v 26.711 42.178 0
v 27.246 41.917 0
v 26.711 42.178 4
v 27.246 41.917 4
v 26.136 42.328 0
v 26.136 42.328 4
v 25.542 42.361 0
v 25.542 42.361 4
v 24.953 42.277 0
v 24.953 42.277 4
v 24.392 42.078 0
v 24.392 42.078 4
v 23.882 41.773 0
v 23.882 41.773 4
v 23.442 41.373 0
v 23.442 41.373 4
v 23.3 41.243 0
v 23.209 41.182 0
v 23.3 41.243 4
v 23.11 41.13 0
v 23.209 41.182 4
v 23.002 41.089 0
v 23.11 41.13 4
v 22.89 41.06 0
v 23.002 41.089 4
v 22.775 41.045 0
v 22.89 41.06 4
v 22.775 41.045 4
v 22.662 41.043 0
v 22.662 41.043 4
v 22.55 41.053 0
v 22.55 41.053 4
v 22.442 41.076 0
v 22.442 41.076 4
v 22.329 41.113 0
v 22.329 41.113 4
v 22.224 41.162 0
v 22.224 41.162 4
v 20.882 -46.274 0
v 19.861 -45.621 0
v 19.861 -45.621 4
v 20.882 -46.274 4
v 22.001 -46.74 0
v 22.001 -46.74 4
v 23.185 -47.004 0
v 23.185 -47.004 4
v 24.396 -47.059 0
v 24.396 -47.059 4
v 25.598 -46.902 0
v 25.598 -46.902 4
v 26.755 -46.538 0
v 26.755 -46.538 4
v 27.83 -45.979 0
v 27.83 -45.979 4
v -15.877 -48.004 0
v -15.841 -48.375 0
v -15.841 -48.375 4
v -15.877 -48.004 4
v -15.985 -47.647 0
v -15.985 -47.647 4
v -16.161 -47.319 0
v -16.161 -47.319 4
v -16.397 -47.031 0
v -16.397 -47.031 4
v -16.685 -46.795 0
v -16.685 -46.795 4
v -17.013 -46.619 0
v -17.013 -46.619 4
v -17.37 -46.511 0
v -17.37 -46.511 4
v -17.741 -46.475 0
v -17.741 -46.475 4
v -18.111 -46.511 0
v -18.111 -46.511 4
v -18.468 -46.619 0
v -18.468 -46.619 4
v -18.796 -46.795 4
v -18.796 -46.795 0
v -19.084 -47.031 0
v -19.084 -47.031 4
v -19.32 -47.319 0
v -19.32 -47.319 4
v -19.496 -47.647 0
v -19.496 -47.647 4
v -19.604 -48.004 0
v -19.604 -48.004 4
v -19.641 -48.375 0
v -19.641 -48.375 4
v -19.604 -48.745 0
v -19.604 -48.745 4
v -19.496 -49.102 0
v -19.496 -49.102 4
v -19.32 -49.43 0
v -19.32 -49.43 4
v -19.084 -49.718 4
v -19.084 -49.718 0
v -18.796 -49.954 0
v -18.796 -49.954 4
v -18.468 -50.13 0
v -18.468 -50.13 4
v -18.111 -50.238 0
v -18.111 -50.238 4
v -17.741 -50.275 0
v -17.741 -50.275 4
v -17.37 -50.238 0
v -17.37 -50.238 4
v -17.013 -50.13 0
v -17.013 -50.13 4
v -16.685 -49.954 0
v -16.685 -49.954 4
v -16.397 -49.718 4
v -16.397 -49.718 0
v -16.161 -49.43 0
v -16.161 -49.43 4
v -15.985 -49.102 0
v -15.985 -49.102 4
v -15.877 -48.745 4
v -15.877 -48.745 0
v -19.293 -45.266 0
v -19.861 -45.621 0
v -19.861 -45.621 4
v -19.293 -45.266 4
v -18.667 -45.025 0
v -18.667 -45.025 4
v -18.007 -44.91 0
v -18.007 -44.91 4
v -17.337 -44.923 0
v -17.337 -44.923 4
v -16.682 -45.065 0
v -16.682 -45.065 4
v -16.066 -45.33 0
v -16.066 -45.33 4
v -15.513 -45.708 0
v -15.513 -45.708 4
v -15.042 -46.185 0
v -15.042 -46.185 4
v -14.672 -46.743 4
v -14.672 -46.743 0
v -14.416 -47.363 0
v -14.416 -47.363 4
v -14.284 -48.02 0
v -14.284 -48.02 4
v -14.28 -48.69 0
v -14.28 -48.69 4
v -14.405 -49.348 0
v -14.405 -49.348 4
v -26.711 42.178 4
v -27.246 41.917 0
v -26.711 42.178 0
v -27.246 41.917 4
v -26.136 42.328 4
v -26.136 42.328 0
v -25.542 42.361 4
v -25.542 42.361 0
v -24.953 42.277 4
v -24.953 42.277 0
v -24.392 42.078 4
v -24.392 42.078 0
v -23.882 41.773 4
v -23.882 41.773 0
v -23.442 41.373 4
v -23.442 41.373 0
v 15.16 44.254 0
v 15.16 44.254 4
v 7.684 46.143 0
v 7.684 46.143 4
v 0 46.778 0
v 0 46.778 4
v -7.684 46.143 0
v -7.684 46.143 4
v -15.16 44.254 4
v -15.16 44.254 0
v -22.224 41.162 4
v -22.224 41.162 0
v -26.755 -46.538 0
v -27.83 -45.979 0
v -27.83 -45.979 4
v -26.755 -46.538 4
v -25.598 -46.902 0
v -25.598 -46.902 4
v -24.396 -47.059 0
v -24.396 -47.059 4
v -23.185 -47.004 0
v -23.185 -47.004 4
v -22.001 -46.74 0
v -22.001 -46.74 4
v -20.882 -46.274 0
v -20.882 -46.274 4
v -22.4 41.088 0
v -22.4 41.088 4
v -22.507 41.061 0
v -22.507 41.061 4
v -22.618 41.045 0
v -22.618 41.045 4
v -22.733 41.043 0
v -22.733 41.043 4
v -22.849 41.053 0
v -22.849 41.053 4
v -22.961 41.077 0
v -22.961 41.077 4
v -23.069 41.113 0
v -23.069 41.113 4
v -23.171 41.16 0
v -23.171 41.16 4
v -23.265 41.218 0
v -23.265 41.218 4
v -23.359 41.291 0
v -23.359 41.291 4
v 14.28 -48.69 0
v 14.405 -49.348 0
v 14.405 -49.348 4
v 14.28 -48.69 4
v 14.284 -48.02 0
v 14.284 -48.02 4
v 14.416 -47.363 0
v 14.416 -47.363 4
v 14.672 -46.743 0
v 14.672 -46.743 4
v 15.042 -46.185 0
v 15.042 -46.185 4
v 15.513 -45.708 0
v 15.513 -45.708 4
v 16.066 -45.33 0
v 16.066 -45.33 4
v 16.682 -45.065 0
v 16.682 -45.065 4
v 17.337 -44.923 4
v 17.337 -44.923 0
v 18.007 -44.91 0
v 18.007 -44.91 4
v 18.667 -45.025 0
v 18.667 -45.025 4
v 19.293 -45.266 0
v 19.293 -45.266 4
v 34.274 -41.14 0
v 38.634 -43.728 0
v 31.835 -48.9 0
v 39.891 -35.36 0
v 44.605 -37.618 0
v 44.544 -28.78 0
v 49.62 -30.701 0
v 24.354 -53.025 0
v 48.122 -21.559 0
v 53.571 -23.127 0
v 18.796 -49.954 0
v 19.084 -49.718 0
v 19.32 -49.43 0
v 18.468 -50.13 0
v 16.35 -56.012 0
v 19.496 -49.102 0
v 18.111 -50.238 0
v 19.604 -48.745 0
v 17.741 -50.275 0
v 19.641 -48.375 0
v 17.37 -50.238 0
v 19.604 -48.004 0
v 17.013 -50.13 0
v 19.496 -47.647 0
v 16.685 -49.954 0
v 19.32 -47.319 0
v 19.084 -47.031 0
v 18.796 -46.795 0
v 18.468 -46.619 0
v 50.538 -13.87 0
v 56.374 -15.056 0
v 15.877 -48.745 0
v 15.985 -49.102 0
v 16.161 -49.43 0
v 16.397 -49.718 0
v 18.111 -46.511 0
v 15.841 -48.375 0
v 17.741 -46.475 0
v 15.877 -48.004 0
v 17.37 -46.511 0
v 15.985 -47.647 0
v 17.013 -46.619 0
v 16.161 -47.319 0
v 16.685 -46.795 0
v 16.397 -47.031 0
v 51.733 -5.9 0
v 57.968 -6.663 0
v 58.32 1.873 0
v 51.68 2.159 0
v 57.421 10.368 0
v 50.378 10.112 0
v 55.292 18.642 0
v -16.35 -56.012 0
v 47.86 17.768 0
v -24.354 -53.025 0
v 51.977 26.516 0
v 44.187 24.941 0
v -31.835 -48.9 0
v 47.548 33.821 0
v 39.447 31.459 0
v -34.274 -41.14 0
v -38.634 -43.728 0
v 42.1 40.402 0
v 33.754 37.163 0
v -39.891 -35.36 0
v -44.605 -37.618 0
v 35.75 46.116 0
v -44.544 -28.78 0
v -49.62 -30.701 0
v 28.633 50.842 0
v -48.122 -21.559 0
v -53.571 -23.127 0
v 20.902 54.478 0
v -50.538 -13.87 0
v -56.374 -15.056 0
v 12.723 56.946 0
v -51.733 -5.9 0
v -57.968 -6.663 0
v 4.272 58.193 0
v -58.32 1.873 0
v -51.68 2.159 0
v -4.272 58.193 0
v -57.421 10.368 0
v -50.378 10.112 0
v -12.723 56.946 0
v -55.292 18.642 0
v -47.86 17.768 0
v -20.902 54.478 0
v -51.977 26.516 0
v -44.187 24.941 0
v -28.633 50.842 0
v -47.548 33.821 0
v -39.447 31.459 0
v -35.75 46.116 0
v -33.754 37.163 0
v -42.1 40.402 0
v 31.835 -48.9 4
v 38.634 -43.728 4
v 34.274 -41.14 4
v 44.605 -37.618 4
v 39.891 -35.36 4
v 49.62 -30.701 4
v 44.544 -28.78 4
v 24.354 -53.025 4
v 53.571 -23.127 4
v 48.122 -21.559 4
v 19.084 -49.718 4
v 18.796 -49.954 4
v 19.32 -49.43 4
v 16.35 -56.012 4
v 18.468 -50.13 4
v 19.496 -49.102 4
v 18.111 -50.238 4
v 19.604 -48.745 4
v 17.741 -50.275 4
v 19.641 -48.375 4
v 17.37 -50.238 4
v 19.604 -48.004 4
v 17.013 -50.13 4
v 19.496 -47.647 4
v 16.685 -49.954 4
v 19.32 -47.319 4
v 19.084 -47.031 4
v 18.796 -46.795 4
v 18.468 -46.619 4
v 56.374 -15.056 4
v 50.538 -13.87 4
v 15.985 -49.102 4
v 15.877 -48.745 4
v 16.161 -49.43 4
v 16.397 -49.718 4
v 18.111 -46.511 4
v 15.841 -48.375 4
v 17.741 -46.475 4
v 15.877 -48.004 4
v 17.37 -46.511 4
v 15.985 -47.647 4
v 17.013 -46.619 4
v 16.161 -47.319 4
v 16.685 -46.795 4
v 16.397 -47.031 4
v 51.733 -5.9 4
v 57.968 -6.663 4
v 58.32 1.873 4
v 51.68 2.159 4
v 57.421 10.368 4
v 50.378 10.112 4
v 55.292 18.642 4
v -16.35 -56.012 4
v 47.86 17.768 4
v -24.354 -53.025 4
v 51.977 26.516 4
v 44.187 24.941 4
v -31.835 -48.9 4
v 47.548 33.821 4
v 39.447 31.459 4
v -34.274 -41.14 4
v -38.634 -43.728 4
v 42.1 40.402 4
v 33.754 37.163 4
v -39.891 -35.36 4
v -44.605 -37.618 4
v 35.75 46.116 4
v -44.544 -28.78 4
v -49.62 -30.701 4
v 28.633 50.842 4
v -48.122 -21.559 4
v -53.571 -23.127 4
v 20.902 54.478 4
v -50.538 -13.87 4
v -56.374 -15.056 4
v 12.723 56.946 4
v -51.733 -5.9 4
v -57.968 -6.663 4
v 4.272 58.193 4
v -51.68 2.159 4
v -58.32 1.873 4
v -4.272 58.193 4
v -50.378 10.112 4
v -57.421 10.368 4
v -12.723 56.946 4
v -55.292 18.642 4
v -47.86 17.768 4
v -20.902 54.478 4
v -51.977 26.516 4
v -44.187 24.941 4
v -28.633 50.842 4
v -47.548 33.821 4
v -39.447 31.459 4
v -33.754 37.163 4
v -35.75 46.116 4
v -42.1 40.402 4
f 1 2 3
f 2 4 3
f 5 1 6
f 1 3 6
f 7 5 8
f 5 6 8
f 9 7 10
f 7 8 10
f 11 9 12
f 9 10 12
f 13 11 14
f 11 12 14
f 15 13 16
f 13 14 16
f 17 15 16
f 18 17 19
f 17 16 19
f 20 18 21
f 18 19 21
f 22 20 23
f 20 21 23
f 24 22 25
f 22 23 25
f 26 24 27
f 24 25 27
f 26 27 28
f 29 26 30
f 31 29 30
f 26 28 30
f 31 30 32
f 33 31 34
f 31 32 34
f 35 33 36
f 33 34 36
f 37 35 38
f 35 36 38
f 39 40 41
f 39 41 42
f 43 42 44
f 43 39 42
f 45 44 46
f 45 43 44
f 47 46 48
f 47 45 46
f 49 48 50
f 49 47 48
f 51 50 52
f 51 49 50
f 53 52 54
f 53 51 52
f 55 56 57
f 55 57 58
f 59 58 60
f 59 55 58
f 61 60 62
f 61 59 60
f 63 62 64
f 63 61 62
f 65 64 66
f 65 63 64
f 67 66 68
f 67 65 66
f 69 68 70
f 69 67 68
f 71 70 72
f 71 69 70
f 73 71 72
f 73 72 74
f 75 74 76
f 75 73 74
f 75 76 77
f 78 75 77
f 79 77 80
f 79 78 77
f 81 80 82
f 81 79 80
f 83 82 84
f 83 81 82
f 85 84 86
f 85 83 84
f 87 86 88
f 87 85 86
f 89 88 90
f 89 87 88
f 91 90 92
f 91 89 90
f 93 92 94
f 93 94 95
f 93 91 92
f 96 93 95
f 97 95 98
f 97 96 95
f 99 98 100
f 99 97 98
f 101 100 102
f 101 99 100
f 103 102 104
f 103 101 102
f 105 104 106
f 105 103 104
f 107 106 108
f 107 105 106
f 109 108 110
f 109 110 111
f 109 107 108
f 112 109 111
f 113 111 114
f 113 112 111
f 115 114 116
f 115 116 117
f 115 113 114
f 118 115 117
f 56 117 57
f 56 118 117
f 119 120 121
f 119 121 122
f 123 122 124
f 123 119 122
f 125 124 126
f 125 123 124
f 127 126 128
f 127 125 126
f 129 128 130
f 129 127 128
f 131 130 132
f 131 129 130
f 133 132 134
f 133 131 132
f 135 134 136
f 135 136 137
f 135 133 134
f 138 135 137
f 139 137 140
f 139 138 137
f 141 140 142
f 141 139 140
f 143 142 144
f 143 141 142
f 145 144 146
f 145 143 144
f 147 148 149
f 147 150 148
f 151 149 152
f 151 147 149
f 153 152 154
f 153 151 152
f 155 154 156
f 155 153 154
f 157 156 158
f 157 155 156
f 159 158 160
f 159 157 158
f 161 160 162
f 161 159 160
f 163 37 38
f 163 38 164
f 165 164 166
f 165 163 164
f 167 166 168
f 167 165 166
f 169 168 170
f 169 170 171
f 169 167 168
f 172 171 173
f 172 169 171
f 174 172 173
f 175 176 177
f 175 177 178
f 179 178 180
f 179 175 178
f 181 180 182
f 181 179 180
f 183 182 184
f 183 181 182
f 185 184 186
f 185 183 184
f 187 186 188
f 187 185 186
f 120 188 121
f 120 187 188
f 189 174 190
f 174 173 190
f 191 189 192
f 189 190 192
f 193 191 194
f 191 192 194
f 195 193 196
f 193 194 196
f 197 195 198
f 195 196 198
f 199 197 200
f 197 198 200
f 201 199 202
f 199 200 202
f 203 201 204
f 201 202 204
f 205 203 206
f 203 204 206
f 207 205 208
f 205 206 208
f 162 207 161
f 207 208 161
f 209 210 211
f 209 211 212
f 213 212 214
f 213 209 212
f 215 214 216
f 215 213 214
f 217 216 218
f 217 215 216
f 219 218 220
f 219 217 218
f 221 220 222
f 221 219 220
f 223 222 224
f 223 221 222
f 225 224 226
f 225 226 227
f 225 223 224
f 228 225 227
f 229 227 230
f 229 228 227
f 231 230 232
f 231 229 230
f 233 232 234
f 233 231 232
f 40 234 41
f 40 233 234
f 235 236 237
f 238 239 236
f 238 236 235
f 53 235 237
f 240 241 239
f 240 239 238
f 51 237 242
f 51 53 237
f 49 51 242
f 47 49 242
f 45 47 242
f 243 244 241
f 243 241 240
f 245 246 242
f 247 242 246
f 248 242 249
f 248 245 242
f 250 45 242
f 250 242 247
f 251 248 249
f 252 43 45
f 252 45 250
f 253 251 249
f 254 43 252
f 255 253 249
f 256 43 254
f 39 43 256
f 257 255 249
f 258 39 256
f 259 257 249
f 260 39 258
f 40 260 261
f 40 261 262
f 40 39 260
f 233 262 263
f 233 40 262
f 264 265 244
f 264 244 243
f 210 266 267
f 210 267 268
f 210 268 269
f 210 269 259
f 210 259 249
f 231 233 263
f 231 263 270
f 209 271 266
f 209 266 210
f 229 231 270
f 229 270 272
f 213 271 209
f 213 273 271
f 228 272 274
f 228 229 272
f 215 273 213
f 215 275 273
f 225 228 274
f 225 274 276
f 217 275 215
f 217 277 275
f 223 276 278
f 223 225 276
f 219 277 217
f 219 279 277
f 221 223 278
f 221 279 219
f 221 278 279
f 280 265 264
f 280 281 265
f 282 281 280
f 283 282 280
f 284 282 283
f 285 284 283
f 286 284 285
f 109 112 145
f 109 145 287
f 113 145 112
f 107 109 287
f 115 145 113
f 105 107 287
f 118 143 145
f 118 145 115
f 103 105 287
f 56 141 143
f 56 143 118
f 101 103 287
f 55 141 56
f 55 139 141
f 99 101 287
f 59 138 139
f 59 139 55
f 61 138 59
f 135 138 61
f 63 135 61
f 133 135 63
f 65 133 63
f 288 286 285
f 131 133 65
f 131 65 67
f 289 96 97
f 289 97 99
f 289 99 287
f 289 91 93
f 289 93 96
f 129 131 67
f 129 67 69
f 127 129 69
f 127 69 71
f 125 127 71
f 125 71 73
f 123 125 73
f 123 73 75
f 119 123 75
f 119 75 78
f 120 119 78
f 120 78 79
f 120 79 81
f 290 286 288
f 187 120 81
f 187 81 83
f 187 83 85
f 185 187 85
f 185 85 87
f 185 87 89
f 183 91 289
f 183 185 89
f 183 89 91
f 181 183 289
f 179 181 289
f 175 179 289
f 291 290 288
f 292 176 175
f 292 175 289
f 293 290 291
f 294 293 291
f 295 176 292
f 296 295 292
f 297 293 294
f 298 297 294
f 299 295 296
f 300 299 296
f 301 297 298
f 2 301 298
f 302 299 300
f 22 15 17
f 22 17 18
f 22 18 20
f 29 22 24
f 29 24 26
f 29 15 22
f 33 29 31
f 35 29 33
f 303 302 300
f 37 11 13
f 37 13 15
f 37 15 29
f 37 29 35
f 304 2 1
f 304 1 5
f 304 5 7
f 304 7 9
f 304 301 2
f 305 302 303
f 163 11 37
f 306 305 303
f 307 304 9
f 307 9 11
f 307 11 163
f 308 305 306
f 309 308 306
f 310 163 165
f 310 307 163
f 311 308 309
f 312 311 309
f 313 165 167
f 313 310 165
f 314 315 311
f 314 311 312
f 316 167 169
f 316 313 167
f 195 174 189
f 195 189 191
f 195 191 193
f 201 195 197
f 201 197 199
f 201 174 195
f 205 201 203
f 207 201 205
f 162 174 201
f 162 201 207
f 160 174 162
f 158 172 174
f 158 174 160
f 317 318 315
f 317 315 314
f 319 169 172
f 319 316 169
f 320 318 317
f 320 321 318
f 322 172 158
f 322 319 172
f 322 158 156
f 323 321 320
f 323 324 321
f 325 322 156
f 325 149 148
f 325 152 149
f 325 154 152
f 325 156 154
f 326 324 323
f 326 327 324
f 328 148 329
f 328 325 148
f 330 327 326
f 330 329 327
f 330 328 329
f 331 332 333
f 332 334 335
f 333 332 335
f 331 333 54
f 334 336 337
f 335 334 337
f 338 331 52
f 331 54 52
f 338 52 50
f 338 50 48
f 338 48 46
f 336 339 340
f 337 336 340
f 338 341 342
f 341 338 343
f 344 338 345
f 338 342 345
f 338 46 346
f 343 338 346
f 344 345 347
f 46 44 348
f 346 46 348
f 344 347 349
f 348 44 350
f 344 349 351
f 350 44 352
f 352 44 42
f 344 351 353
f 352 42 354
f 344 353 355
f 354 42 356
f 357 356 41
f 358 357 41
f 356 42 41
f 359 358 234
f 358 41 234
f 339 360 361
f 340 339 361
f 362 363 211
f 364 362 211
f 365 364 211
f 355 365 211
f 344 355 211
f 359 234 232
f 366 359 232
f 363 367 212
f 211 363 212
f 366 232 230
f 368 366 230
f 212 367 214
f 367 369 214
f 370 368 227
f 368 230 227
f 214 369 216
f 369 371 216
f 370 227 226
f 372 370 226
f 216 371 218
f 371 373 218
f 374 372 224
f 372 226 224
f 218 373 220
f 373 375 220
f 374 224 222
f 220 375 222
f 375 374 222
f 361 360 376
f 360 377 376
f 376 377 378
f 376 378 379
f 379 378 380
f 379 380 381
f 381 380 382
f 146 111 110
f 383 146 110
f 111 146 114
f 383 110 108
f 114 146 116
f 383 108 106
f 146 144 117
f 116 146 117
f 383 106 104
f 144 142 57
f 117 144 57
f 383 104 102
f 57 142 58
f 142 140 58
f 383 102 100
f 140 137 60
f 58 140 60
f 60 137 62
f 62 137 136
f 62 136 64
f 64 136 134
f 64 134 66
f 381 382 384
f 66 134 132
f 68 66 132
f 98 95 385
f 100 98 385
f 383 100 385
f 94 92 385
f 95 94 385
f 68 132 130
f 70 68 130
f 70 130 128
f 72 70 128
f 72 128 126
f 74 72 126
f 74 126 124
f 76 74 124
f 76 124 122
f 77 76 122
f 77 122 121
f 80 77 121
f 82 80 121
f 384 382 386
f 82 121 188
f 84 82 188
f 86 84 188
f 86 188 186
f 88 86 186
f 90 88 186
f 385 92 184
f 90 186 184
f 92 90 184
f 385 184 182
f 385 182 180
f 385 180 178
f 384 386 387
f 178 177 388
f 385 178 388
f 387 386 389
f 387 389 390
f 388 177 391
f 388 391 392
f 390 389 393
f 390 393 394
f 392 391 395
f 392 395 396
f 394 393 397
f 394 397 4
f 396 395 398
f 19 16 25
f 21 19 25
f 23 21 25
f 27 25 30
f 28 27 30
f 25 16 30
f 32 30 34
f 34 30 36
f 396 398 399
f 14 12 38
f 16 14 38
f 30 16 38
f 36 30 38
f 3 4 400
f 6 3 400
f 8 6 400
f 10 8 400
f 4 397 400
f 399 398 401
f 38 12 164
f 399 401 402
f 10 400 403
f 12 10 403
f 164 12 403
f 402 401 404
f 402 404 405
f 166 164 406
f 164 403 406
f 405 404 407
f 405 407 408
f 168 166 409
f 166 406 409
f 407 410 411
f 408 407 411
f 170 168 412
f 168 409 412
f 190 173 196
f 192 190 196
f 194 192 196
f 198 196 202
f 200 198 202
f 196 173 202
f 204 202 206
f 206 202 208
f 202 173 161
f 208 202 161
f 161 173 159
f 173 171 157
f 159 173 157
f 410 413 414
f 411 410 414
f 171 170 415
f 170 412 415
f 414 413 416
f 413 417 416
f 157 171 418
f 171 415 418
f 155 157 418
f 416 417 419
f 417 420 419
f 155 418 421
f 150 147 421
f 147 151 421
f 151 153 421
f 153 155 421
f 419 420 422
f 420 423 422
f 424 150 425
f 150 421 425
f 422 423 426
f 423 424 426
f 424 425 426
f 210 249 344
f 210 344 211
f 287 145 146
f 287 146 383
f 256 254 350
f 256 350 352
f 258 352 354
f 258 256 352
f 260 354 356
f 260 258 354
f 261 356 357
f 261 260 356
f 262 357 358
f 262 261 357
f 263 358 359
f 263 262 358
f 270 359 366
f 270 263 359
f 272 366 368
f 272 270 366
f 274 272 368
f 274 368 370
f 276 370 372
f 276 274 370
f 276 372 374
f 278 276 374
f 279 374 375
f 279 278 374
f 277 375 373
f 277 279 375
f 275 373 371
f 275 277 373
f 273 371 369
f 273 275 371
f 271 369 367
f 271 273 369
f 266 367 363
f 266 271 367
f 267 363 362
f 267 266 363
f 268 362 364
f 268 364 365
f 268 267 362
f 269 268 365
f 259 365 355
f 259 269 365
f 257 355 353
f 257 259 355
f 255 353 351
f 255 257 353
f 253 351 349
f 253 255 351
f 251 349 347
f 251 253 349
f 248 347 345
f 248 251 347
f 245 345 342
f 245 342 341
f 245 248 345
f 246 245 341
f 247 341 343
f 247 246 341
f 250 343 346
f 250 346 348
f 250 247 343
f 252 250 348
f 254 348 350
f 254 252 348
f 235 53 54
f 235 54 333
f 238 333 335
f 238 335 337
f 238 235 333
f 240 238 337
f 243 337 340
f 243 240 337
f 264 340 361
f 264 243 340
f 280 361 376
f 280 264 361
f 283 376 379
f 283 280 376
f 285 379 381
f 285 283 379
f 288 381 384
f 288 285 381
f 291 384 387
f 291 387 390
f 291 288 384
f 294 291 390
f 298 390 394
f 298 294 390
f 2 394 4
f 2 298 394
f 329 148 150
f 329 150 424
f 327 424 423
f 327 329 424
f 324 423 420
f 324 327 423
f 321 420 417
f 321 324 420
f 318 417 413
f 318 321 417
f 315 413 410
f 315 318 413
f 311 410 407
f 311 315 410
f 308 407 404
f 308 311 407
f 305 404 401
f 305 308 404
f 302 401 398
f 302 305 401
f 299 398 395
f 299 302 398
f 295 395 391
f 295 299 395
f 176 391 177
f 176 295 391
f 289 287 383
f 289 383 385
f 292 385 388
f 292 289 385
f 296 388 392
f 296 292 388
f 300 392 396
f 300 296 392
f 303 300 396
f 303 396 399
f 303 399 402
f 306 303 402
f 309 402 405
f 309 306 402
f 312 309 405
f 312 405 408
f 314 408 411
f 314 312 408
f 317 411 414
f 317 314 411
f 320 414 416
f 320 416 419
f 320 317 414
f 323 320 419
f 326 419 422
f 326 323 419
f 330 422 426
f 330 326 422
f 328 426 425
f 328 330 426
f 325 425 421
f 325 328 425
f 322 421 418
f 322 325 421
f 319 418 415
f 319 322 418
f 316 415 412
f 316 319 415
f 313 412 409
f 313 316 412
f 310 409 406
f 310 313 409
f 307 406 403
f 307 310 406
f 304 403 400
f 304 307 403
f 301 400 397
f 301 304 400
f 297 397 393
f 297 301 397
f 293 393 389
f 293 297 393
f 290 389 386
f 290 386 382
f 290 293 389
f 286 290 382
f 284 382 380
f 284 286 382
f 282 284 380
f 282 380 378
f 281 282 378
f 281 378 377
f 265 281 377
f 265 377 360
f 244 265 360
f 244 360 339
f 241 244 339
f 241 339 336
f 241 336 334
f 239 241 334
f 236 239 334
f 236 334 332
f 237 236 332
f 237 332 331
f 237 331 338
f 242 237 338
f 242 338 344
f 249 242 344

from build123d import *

# Parameters (mm, degrees)
SKETCH1_R           = 1.9
BOSS_EXTRUDE1_DEPTH = 4
BOSS_EXTRUDE2_DEPTH = 4
FILLET1_R           = 3
FILLET2_R           = 1


with BuildPart() as part:
    # Sketch1 → Boss-Extrude1 (new body)
    with BuildSketch(Plane.XY):
        with BuildLine():
            Line((16.350014, -56.012494518), (14.404736199, -49.348288471))
            ThreePointArc((14.404736199, -49.348288471), (15.780421817, -45.505146042), (19.860711038, -45.621311922))
            ThreePointArc((19.860711038, -45.621311922), (23.789076326, -47.057783014), (27.830450892, -45.979453446))
            ThreePointArc((27.830450892, -45.979453446), (0, 49.65), (-27.830450892, -45.979453446))
            ThreePointArc((-27.830450892, -45.979453446), (-23.789076326, -47.057783014), (-19.860711038, -45.621311922))
            ThreePointArc((-19.860711038, -45.621311922), (-15.780421817, -45.505146042), (-14.404736199, -49.348288471))
            Line((-14.404736199, -49.348288471), (-16.350014, -56.012494518))
            ThreePointArc((-16.350014, -56.012494518), (0, 58.35), (16.350014, -56.012494518))
        make_face()
        with Locations((17.740527432, -48.374572984)):
            Circle(SKETCH1_R, mode=Mode.SUBTRACT)
        with Locations((-17.740527432, -48.374572984)):
            Circle(SKETCH1_R, mode=Mode.SUBTRACT)
    extrude(amount=BOSS_EXTRUDE1_DEPTH)

    # Sketch2 → Boss-Extrude2 (add)
    with BuildSketch(Plane(origin=(0, 0, 0), x_dir=(-1, 0, 0), z_dir=(0, 0, -1))):
        with BuildLine():
            Line((23, 40.733405839), (24.5, 43.498463103))
            ThreePointArc((24.5, 43.498463103), (0, 49.65), (-24.5, 43.498463103))
            Line((-24.5, 43.498463103), (-23, 40.733405839))
            ThreePointArc((-23, 40.733405839), (0, 46.778310692), (23, 40.733405839))
        make_face()
    extrude(amount=-BOSS_EXTRUDE2_DEPTH)

    # Fillet1
    fillet1_edges = [part.edges().sort_by_distance(p)[0] for p in [
        (-24.5, 43.498463103, 2),
        (24.5, 43.498463103, 2),
    ]]
    fillet(fillet1_edges, radius=FILLET1_R)

    # Fillet2
    fillet2_edges = [part.edges().sort_by_distance(p)[0] for p in [
        (-23, 40.733405839, 2),
        (23, 40.733405839, 2),
    ]]
    fillet(fillet2_edges, radius=FILLET2_R)


solid = part.part
